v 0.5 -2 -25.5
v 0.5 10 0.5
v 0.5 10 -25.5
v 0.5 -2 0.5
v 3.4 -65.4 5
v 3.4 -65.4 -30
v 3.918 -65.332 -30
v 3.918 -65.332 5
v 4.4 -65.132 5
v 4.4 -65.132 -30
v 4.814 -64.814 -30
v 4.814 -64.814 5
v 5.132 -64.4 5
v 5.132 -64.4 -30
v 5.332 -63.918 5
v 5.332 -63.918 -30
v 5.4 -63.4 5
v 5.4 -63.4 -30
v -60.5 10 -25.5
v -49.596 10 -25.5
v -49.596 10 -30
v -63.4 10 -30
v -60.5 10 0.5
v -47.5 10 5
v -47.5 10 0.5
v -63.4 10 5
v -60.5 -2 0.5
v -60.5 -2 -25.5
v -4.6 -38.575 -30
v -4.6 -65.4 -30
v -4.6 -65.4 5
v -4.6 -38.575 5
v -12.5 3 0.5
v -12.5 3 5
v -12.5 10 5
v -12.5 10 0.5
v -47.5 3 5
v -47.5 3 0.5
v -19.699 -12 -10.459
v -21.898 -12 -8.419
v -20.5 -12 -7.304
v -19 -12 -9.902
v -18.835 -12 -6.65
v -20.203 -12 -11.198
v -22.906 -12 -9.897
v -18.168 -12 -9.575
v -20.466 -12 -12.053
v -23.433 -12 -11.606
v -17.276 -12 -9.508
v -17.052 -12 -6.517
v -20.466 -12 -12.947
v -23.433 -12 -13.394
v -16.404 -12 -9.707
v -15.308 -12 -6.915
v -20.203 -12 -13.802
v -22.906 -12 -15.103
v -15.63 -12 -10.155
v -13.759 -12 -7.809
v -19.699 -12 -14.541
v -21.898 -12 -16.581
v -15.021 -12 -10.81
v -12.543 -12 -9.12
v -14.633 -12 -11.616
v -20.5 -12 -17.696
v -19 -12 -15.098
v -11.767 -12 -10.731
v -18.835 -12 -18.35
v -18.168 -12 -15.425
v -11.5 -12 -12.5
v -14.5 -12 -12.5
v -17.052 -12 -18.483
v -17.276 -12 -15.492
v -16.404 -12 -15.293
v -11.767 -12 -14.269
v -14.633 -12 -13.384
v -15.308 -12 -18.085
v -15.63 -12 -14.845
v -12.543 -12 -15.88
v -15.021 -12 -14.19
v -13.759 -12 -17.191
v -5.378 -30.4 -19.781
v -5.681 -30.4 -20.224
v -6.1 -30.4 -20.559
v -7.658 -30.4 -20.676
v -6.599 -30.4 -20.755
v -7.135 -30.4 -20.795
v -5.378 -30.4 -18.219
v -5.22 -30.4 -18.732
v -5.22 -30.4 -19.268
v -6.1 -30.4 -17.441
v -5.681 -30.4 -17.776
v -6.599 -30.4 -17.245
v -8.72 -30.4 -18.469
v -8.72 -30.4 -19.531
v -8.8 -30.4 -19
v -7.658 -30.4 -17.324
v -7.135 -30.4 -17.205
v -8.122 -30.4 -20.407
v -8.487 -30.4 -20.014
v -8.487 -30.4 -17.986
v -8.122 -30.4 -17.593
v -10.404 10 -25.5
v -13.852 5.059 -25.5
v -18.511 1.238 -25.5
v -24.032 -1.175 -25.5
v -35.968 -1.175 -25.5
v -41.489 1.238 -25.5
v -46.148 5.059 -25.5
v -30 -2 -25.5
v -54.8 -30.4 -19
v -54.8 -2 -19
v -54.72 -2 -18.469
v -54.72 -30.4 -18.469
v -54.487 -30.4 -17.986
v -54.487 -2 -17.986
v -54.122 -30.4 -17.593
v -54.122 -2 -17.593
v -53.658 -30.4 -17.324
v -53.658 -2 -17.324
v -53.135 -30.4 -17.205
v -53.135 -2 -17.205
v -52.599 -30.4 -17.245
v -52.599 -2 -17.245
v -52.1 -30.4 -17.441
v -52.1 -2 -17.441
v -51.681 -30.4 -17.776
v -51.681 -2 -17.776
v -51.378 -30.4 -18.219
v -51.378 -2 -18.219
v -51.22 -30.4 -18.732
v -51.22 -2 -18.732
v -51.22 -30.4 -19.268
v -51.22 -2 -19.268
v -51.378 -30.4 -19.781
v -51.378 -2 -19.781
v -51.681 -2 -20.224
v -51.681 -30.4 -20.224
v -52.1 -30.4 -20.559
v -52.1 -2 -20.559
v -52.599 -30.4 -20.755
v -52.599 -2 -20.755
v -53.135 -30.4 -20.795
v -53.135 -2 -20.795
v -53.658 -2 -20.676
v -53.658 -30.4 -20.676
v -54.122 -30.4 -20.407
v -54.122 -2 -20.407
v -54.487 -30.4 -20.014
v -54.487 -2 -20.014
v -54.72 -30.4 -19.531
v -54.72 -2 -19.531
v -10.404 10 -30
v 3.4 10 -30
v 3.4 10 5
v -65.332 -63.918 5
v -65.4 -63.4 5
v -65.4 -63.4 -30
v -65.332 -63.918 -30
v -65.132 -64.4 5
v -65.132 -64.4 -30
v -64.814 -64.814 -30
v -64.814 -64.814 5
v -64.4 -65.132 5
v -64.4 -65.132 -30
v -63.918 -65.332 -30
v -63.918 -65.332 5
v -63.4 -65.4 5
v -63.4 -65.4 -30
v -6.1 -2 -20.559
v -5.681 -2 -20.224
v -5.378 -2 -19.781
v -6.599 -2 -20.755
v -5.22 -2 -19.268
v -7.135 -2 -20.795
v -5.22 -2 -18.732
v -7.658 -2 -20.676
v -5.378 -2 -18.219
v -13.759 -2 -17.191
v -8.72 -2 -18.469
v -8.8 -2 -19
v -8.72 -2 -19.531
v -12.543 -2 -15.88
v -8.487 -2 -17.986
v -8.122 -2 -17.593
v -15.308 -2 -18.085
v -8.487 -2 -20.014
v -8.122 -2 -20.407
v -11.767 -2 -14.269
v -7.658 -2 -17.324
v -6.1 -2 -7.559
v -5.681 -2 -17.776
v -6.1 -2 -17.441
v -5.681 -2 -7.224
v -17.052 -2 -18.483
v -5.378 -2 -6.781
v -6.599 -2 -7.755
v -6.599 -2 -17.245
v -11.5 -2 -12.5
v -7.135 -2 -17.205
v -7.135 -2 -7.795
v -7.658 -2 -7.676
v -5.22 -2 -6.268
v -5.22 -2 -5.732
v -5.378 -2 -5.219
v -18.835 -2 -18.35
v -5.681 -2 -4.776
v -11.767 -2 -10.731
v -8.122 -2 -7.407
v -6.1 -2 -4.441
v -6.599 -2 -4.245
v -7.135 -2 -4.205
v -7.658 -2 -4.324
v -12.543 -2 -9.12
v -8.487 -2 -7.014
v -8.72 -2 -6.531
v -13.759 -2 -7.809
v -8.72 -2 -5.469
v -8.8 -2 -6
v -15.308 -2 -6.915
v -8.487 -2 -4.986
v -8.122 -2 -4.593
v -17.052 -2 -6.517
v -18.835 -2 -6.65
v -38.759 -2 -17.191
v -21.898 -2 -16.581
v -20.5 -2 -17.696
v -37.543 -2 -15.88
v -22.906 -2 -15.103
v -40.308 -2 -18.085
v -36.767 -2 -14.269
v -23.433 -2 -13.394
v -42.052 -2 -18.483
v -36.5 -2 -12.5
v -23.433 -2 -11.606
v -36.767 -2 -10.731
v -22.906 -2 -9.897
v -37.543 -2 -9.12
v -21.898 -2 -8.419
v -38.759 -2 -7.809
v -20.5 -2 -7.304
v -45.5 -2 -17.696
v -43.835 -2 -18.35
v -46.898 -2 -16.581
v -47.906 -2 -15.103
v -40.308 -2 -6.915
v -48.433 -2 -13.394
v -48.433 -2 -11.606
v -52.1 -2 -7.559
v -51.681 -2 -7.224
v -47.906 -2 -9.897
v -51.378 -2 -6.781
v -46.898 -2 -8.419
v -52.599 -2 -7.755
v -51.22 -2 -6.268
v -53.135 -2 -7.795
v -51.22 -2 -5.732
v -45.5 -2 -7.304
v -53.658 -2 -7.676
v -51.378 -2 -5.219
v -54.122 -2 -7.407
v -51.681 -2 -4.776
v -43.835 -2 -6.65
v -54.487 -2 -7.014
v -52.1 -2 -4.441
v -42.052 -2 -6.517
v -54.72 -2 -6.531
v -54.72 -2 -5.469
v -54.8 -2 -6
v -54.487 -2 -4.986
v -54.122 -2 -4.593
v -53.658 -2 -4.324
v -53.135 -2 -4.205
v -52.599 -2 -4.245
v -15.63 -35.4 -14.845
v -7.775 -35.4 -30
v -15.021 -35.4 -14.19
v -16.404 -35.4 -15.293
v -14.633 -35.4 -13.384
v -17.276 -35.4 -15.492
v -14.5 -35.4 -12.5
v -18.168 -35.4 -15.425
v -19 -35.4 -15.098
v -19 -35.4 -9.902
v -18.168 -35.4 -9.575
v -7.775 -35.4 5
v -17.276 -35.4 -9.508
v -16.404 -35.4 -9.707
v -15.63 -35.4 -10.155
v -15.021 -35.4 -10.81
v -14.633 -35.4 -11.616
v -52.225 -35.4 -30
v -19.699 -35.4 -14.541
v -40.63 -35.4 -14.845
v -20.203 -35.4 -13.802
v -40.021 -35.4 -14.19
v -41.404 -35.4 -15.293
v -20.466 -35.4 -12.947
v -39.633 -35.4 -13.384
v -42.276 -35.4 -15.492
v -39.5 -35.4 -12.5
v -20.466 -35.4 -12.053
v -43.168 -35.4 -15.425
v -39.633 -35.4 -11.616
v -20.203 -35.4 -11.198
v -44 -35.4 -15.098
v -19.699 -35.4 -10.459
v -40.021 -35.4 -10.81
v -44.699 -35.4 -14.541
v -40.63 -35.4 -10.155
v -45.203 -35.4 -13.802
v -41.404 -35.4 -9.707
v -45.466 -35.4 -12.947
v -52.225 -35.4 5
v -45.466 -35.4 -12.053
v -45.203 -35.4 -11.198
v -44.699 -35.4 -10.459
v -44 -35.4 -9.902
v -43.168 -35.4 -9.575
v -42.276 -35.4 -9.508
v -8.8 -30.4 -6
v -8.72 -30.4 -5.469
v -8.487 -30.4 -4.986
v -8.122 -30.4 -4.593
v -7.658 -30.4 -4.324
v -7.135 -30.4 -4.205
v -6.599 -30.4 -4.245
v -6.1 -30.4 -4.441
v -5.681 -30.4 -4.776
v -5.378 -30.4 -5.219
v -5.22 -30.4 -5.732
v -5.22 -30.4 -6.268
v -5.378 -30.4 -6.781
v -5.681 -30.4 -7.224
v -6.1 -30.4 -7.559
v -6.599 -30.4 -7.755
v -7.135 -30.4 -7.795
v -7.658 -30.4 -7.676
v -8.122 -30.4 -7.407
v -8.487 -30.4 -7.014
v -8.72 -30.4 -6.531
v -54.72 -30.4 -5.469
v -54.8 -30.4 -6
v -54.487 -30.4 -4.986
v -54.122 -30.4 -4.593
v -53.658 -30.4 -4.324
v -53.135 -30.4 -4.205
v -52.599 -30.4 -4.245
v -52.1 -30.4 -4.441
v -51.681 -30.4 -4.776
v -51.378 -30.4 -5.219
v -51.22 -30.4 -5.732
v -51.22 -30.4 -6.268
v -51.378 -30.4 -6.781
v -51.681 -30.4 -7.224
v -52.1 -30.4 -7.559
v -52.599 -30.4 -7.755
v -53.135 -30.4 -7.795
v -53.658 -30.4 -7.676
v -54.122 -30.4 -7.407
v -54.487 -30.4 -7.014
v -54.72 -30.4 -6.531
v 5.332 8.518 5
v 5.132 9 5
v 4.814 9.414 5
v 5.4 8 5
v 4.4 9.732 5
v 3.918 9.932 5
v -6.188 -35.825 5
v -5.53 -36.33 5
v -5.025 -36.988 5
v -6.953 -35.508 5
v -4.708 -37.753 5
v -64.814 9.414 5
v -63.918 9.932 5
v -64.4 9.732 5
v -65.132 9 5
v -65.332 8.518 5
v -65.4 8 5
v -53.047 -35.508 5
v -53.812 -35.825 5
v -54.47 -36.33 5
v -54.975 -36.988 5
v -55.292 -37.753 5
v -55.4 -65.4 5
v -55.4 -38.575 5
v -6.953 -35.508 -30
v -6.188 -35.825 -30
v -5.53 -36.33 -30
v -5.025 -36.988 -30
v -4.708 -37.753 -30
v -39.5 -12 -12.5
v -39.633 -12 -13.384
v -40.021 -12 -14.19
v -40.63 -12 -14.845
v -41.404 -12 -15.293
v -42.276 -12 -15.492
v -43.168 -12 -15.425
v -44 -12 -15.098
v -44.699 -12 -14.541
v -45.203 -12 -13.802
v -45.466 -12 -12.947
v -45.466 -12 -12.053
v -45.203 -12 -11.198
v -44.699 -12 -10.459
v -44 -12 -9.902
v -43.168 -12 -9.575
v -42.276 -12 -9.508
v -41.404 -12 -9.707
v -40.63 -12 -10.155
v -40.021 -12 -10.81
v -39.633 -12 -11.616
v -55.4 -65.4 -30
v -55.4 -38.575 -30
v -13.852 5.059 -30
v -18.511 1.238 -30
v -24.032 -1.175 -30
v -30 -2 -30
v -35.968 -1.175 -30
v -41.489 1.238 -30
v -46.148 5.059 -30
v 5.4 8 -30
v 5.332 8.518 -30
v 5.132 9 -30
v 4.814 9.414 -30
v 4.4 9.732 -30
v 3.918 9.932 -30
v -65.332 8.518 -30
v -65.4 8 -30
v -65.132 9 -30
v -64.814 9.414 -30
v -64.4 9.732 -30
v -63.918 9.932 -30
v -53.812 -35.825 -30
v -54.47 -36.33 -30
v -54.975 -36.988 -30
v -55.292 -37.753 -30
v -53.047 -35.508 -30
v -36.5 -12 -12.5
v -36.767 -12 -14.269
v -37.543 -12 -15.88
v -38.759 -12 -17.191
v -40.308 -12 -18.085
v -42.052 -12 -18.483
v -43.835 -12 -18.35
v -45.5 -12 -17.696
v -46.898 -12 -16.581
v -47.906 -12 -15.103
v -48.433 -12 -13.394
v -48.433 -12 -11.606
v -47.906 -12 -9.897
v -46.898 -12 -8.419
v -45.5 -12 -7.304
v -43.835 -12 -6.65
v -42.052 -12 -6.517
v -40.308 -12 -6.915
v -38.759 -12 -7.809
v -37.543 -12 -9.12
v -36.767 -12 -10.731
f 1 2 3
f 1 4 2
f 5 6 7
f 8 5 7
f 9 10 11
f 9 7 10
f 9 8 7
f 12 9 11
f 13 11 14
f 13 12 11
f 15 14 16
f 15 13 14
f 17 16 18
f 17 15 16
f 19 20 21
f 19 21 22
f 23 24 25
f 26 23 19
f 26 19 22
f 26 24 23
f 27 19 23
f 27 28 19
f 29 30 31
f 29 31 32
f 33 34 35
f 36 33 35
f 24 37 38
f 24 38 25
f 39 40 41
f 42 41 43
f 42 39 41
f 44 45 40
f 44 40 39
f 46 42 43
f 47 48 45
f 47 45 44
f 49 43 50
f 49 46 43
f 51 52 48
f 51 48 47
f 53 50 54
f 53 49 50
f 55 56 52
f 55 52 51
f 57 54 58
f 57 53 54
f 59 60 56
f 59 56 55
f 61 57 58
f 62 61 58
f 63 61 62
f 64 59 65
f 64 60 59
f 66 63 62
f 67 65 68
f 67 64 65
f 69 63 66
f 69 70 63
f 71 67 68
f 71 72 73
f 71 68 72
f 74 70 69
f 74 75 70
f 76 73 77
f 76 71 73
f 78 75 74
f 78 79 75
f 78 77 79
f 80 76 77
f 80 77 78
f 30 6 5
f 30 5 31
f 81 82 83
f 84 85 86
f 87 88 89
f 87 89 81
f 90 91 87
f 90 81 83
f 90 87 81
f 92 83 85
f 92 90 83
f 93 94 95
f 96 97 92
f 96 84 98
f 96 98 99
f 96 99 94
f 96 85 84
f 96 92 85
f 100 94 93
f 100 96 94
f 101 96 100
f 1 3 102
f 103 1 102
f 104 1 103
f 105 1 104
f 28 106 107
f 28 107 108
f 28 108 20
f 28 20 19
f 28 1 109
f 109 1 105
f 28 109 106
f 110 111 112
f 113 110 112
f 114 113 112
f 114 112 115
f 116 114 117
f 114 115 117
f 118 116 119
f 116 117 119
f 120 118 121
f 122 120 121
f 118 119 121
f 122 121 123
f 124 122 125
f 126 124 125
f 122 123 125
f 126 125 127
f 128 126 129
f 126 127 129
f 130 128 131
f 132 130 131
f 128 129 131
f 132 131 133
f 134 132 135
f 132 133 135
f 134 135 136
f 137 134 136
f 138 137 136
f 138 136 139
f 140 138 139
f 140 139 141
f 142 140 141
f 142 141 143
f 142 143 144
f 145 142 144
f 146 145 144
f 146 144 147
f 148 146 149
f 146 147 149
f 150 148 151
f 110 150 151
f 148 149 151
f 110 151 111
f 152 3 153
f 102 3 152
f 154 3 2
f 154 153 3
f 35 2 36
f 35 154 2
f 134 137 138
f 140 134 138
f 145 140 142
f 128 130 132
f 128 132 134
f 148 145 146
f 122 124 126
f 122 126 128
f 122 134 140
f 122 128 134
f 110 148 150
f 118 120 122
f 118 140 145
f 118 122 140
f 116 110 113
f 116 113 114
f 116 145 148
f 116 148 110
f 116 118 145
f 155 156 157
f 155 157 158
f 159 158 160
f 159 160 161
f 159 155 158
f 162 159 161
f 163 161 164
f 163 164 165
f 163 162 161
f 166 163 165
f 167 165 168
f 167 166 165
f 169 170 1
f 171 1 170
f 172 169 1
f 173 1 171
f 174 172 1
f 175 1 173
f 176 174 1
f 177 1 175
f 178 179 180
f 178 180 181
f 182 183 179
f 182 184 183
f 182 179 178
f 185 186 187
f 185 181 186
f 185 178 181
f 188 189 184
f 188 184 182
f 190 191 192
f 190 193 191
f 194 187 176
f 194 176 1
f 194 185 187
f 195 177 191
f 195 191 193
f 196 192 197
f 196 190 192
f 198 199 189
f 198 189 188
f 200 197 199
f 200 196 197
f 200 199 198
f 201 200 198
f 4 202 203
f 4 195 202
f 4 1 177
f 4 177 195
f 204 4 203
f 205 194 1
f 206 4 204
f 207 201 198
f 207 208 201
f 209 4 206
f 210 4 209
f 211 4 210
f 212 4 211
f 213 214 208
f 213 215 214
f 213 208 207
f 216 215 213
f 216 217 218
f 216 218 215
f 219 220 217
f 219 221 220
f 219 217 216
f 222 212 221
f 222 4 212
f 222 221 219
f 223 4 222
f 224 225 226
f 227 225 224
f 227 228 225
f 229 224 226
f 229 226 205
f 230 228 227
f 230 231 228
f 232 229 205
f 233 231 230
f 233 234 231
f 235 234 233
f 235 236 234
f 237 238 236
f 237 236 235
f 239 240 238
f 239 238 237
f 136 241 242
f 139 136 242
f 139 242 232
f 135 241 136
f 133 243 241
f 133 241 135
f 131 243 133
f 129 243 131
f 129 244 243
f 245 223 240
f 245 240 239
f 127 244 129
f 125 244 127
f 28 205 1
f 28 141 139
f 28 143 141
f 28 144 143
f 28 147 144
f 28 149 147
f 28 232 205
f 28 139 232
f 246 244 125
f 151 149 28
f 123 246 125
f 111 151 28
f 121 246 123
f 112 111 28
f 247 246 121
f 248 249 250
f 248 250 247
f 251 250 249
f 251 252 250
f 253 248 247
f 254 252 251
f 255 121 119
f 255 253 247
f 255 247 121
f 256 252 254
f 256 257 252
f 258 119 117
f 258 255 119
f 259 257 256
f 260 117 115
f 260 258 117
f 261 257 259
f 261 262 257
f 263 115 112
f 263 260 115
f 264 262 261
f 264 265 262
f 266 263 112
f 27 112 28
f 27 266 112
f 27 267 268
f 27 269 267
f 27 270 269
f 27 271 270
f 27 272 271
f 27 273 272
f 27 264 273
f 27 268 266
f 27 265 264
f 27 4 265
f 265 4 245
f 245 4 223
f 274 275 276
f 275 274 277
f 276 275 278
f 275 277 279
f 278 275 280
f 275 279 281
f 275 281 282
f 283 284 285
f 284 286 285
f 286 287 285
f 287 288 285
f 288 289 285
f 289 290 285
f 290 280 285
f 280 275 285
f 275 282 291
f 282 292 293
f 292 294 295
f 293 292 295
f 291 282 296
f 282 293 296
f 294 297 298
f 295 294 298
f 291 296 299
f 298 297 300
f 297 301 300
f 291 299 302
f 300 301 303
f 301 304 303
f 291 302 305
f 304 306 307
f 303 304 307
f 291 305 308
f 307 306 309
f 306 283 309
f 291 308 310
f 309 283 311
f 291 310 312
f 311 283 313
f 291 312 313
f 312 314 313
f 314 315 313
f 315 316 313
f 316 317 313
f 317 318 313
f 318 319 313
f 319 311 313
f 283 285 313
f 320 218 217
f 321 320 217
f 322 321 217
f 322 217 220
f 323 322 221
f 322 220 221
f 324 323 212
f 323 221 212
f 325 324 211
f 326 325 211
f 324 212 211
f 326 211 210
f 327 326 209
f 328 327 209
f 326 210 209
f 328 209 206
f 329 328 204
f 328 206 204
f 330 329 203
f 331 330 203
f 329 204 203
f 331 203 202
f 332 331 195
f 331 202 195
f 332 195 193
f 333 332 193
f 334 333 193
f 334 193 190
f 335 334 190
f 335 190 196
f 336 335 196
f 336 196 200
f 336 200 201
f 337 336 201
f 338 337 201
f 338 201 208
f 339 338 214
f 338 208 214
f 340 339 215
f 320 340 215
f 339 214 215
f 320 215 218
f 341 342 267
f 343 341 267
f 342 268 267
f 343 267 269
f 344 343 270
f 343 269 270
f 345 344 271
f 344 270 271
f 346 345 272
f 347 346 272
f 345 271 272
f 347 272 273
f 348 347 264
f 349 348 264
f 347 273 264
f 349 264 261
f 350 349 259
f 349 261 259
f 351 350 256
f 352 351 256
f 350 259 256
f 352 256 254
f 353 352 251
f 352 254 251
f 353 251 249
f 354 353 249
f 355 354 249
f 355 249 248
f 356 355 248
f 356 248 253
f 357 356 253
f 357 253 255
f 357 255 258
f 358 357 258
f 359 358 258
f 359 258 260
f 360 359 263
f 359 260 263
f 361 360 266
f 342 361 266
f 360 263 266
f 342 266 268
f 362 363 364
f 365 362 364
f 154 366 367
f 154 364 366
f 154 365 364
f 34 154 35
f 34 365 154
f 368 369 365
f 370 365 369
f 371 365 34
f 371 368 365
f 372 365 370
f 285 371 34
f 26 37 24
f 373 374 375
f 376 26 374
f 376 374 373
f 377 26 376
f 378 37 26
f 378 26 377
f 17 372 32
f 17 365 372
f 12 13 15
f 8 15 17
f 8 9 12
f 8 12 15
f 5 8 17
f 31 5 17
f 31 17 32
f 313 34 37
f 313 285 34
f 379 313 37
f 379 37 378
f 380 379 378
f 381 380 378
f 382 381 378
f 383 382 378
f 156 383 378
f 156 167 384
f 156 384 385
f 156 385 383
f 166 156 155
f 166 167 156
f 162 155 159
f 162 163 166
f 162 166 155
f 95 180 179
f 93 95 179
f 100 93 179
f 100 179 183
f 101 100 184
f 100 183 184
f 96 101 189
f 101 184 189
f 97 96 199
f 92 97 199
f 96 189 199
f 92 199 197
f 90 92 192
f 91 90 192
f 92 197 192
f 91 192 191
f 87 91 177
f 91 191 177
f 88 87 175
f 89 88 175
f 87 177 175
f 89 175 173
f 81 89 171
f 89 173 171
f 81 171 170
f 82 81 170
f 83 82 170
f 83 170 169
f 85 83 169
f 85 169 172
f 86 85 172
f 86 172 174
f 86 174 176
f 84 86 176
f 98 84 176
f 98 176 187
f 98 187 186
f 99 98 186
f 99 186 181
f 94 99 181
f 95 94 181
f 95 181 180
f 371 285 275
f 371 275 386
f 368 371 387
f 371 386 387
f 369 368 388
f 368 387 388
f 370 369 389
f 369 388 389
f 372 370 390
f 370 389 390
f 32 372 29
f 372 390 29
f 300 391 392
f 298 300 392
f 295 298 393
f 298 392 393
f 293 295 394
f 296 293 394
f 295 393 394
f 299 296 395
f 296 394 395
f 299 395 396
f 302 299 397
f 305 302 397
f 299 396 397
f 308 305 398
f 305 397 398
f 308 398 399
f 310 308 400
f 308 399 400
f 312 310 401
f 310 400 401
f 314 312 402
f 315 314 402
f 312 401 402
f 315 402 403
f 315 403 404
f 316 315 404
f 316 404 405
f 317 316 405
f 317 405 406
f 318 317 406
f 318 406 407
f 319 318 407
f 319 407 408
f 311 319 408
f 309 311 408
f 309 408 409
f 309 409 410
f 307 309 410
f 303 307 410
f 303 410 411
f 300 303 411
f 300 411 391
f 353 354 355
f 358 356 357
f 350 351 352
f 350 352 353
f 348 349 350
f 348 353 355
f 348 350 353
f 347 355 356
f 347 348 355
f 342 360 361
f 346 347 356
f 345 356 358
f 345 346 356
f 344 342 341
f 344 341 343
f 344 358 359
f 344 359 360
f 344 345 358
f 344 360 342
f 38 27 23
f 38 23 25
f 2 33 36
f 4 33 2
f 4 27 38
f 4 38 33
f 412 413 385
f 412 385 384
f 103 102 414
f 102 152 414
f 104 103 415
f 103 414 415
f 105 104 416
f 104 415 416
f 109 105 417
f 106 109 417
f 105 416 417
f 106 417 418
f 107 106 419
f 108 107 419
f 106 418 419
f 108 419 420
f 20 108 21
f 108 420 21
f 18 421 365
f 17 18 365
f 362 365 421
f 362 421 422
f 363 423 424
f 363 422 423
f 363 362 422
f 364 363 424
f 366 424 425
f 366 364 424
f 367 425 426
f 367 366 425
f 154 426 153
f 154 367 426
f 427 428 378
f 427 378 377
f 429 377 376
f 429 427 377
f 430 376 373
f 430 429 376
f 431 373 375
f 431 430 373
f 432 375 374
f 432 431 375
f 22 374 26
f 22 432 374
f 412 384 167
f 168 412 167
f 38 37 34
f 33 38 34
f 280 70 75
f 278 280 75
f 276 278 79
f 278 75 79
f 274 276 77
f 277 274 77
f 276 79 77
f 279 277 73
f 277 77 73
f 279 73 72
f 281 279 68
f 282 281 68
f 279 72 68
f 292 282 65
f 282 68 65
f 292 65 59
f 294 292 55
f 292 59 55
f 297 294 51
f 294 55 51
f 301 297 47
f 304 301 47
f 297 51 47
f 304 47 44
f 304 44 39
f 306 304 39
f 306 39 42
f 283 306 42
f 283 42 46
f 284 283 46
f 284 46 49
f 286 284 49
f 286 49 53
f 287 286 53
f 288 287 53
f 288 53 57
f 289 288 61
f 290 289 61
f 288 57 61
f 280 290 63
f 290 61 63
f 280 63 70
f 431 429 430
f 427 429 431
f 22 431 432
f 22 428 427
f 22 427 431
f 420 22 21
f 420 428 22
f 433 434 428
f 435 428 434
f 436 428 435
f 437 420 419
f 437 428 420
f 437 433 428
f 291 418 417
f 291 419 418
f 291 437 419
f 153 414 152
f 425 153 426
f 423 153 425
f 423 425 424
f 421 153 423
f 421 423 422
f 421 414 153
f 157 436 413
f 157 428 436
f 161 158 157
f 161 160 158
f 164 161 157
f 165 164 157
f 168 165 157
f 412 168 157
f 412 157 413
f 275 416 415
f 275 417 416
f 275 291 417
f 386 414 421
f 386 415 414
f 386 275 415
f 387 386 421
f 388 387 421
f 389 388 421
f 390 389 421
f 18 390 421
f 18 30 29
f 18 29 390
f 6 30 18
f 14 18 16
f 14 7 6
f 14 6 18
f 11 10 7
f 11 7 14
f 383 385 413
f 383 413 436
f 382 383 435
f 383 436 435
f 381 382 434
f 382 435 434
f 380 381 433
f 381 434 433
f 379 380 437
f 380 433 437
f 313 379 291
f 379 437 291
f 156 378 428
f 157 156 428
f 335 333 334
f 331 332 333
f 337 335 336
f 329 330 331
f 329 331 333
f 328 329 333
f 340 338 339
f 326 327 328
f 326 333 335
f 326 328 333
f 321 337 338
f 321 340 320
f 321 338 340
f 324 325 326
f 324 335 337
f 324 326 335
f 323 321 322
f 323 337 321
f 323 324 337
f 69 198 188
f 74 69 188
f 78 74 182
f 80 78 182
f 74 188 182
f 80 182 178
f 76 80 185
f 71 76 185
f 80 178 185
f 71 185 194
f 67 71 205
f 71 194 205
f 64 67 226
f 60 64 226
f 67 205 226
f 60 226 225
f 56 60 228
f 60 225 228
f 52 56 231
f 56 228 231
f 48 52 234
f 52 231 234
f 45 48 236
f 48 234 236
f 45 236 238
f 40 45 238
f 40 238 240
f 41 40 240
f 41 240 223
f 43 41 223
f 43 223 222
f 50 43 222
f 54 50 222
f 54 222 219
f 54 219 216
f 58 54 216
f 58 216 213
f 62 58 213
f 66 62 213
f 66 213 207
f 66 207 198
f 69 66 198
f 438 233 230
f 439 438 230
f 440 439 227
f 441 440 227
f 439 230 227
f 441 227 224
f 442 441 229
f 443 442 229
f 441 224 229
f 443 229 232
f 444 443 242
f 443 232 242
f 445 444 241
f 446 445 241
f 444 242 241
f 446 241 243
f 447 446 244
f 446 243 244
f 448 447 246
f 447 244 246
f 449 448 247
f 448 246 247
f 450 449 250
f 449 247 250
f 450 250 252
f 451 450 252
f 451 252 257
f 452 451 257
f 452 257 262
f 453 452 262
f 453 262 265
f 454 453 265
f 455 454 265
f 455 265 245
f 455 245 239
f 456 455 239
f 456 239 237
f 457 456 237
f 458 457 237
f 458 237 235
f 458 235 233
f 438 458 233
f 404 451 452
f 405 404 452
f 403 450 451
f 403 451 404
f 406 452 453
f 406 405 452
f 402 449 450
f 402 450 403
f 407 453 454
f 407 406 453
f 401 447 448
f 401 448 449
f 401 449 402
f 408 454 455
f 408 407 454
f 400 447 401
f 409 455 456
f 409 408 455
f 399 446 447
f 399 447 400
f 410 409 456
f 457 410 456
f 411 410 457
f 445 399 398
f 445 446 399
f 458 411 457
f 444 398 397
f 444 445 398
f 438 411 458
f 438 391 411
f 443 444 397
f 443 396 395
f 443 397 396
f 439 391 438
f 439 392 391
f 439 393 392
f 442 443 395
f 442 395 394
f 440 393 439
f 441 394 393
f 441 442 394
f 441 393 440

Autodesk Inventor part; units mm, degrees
ref_plane "YZ Plane" through (0, 0, 0) normal (1, 0, 0) x (0, 1, 0)
ref_plane "XZ Plane" through (0, 0, 0) normal (0, 1, 0) x (-1, 0, 0)
ref_plane "XY Plane" through (0, 0, 0) normal (0, 0, 1) x (1, 0, 0)
sketch "Sketch1" plane through (0, 0, 0) normal (0, 1, 0) x (-1, 0, 0)
  line L0 (0, 0) -> (60, 0) construction
  line L1 (60, 0) -> (60, -25) construction
  line L2 (60, -25) -> (0, -25) construction
  line L3 (0, -25) -> (0, 0) construction
  line L4 (60.5, 0.5) -> (-0.5, 0.5)
  line L5 (-0.5, 0.5) -> (-0.5, -25.5)
  line L6 (-0.5, -25.5) -> (60.5, -25.5)
  line L7 (60.5, -25.5) -> (60.5, 0.5)
  circle A0 centre (53, -19) radius 1.8
  circle A1 centre (7, -19) radius 1.8
  circle A2 centre (7, -6) radius 1.8
  circle A3 centre (53, -6) radius 1.8
  line L8 (53, -19) -> (7, -19) construction
  line L9 (7, -19) -> (7, -6) construction
  point P0 (30, -19)
  point P1 (30, -25)
  point P2 (7, -12.5)
  point P3 (0, -12.5)
  dimension "d0" = 25
  dimension "d1" = 60
  dimension "d2" = 0.5
  dimension "d3" = 0.5
  dimension "d4" = 0.5
  dimension "d5" = 0.5
  dimension "d6" = 3.6
  dimension "d7" = 46
  dimension "d8" = 13
sketch "Sketch2" plane through (0, 0, 0) normal (0, 1, 0) x (-1, 0, 0)
  line L0 (-5.4, 5) -> (65.4, 5)
  line L1 (65.4, 5) -> (65.4, -30)
  line L2 (65.4, -30) -> (-5.4, -30)
  line L3 (-5.4, -30) -> (-5.4, 5)
  line L4 (60.5, -25.5) -> (60.5, 0.5) construction
  line L5 (-0.5, 0.5) -> (-0.5, -25.5) construction
  line L6 (-0.5, -25.5) -> (60.5, -25.5) construction
  point P0 (0, 0)
  point P1 (60.5, -12.5)
  point P2 (65.4, -12.5)
  point P3 (30, -25.5)
  point P4 (30, -30)
  dimension "d9" = 70.8
  dimension "d10" = 35
extrude "Extrusion1" add sketch "Sketch2" along normal blind 10 and the other way blind 35.4
extrude "Extrusion2" cut sketch "Sketch1" along normal blind 10 and the other way blind 2
extrude "Extrusion3" cut sketch "Sketch1" along normal blind 10 and the other way blind 30.4 contours A0 | A1 | A2 | A3
sketch "Sketch3" plane through (5.4, 10, -30) normal (0, 0, -1) x (-1, 0, 0)
  line L0 (70.8, -45.4) -> (0, -45.4) projected
  line L1 (0, -45.4) -> (0, -75.4)
  line L2 (0, -75.4) -> (10, -75.4)
  line L3 (10, -75.4) -> (10, -48.575)
  line L4 (13.175, -45.4) -> (57.625, -45.4)
  line L5 (60.8, -48.575) -> (60.8, -75.4)
  line L6 (60.8, -75.4) -> (70.8, -75.4)
  line L7 (70.8, -75.4) -> (70.8, -45.4)
  arc A0 (13.175, -45.4) -> (10, -48.575) centre (13.175, -48.575) ccw
  arc A1 (60.8, -48.575) -> (57.625, -45.4) centre (57.625, -48.575) ccw
  point P0 (5.4, -10)
  point P1 (10, -45.4)
  point P2 (60.8, -45.4)
  point P3 (35.4, -45.4)
  point P4 (13.175, -45.4)
  point P5 (57.625, -45.4)
  dimension "d23" = 50.8
  dimension "d24" = 3.175
  dimension "d25" = 10
  dimension "d26" = 30
extrude "Extrusion4" add sketch "Sketch3" against normal up to surface (35 mm away)
sketch "Sketch4" plane through (0, -2, 0) normal (0, 1, 0) x (1, 0, 0)
  circle A0 centre (-42.5, 12.5) radius 3
  circle A1 centre (-17.5, 12.5) radius 3
  line L0 (-60.5, 25.5) -> (0.5, 25.5) construction
  line L1 (-60.5, -0.5) -> (-60.5, 25.5) construction
  line L2 (-42.5, 12.5) -> (-17.5, 12.5) construction
  point P0 (0, 0)
  point P1 (-30, 25.5)
  point P2 (-30, 12.5)
  point P3 (-60.5, 12.5)
  dimension "d29" = 6
  dimension "d30" = 25
extrude "Extrusion5" cut sketch "Sketch4" against normal up to surface (33.4 mm away)
sketch "Sketch5" plane through (0, -2, 0) normal (0, 1, 0) x (1, 0, 0)
  circle A0 centre (-42.5, 12.5) radius 3 construction
  circle A1 centre (-17.5, 12.5) radius 3 construction
  circle A2 centre (-17.5, 12.5) radius 6
  circle A3 centre (-42.5, 12.5) radius 6
  point P0 (0, 0)
  dimension "d34" = 12
extrude "Extrusion6" cut sketch "Sketch5" against normal blind 10
fillet "Fillet1" radius 2 2 edges at (-65.4, 10, -12.5) (5.4, 10, -12.5)
fillet "Fillet2" radius 2 2 edges at (-65.4, -65.4, -12.5) (5.4, -65.4, -12.5)
sketch "Sketch6" plane through (-52.225, -35.4, 5) normal (0, 0, 1) x (1, 0, 0)
  line L0 (44.45, 0) -> (0, 0) construction
  line L1 (4.725, 38.4) -> (39.725, 38.4)
  line L2 (44.45, 0) -> (0, 0) projected
  line L3 (-11.175, 45.4) -> (55.625, 45.4) projected
  line L4 (39.725, 38.4) -> (39.725, 45.4)
  line L5 (4.725, 38.4) -> (4.725, 45.4)
  point P0 (52.225, 35.4)
  point P1 (22.225, 38.4)
  point P2 (22.225, 0)
  point P3 (70.325, 0)
  point P4 (-0.475, 0)
  dimension "d39" = 38.4
  dimension "d40" = 35
extrude "Extrusion7" cut sketch "Sketch6" against normal up to surface (4.5 mm away)
sketch "Sketch7" plane through (-4.6, -65.4, -30) normal (0, 0, -1) x (-1, 0, 0)
  arc A0 (5.8041, 75.4) -> (44.9959, 75.4) centre (25.4, 85.4) ccw
  line L0 (-8, 75.4) -> (58.8, 75.4) projected
  point P0 (-4.6, 65.4)
  point P1 (25.4, 75.4)
  dimension "d44" = 22
  dimension "d45" = 10
extrude "Extrusion8" cut sketch "Sketch7" against normal blind 10
properties part number "BK12_Spacer"
